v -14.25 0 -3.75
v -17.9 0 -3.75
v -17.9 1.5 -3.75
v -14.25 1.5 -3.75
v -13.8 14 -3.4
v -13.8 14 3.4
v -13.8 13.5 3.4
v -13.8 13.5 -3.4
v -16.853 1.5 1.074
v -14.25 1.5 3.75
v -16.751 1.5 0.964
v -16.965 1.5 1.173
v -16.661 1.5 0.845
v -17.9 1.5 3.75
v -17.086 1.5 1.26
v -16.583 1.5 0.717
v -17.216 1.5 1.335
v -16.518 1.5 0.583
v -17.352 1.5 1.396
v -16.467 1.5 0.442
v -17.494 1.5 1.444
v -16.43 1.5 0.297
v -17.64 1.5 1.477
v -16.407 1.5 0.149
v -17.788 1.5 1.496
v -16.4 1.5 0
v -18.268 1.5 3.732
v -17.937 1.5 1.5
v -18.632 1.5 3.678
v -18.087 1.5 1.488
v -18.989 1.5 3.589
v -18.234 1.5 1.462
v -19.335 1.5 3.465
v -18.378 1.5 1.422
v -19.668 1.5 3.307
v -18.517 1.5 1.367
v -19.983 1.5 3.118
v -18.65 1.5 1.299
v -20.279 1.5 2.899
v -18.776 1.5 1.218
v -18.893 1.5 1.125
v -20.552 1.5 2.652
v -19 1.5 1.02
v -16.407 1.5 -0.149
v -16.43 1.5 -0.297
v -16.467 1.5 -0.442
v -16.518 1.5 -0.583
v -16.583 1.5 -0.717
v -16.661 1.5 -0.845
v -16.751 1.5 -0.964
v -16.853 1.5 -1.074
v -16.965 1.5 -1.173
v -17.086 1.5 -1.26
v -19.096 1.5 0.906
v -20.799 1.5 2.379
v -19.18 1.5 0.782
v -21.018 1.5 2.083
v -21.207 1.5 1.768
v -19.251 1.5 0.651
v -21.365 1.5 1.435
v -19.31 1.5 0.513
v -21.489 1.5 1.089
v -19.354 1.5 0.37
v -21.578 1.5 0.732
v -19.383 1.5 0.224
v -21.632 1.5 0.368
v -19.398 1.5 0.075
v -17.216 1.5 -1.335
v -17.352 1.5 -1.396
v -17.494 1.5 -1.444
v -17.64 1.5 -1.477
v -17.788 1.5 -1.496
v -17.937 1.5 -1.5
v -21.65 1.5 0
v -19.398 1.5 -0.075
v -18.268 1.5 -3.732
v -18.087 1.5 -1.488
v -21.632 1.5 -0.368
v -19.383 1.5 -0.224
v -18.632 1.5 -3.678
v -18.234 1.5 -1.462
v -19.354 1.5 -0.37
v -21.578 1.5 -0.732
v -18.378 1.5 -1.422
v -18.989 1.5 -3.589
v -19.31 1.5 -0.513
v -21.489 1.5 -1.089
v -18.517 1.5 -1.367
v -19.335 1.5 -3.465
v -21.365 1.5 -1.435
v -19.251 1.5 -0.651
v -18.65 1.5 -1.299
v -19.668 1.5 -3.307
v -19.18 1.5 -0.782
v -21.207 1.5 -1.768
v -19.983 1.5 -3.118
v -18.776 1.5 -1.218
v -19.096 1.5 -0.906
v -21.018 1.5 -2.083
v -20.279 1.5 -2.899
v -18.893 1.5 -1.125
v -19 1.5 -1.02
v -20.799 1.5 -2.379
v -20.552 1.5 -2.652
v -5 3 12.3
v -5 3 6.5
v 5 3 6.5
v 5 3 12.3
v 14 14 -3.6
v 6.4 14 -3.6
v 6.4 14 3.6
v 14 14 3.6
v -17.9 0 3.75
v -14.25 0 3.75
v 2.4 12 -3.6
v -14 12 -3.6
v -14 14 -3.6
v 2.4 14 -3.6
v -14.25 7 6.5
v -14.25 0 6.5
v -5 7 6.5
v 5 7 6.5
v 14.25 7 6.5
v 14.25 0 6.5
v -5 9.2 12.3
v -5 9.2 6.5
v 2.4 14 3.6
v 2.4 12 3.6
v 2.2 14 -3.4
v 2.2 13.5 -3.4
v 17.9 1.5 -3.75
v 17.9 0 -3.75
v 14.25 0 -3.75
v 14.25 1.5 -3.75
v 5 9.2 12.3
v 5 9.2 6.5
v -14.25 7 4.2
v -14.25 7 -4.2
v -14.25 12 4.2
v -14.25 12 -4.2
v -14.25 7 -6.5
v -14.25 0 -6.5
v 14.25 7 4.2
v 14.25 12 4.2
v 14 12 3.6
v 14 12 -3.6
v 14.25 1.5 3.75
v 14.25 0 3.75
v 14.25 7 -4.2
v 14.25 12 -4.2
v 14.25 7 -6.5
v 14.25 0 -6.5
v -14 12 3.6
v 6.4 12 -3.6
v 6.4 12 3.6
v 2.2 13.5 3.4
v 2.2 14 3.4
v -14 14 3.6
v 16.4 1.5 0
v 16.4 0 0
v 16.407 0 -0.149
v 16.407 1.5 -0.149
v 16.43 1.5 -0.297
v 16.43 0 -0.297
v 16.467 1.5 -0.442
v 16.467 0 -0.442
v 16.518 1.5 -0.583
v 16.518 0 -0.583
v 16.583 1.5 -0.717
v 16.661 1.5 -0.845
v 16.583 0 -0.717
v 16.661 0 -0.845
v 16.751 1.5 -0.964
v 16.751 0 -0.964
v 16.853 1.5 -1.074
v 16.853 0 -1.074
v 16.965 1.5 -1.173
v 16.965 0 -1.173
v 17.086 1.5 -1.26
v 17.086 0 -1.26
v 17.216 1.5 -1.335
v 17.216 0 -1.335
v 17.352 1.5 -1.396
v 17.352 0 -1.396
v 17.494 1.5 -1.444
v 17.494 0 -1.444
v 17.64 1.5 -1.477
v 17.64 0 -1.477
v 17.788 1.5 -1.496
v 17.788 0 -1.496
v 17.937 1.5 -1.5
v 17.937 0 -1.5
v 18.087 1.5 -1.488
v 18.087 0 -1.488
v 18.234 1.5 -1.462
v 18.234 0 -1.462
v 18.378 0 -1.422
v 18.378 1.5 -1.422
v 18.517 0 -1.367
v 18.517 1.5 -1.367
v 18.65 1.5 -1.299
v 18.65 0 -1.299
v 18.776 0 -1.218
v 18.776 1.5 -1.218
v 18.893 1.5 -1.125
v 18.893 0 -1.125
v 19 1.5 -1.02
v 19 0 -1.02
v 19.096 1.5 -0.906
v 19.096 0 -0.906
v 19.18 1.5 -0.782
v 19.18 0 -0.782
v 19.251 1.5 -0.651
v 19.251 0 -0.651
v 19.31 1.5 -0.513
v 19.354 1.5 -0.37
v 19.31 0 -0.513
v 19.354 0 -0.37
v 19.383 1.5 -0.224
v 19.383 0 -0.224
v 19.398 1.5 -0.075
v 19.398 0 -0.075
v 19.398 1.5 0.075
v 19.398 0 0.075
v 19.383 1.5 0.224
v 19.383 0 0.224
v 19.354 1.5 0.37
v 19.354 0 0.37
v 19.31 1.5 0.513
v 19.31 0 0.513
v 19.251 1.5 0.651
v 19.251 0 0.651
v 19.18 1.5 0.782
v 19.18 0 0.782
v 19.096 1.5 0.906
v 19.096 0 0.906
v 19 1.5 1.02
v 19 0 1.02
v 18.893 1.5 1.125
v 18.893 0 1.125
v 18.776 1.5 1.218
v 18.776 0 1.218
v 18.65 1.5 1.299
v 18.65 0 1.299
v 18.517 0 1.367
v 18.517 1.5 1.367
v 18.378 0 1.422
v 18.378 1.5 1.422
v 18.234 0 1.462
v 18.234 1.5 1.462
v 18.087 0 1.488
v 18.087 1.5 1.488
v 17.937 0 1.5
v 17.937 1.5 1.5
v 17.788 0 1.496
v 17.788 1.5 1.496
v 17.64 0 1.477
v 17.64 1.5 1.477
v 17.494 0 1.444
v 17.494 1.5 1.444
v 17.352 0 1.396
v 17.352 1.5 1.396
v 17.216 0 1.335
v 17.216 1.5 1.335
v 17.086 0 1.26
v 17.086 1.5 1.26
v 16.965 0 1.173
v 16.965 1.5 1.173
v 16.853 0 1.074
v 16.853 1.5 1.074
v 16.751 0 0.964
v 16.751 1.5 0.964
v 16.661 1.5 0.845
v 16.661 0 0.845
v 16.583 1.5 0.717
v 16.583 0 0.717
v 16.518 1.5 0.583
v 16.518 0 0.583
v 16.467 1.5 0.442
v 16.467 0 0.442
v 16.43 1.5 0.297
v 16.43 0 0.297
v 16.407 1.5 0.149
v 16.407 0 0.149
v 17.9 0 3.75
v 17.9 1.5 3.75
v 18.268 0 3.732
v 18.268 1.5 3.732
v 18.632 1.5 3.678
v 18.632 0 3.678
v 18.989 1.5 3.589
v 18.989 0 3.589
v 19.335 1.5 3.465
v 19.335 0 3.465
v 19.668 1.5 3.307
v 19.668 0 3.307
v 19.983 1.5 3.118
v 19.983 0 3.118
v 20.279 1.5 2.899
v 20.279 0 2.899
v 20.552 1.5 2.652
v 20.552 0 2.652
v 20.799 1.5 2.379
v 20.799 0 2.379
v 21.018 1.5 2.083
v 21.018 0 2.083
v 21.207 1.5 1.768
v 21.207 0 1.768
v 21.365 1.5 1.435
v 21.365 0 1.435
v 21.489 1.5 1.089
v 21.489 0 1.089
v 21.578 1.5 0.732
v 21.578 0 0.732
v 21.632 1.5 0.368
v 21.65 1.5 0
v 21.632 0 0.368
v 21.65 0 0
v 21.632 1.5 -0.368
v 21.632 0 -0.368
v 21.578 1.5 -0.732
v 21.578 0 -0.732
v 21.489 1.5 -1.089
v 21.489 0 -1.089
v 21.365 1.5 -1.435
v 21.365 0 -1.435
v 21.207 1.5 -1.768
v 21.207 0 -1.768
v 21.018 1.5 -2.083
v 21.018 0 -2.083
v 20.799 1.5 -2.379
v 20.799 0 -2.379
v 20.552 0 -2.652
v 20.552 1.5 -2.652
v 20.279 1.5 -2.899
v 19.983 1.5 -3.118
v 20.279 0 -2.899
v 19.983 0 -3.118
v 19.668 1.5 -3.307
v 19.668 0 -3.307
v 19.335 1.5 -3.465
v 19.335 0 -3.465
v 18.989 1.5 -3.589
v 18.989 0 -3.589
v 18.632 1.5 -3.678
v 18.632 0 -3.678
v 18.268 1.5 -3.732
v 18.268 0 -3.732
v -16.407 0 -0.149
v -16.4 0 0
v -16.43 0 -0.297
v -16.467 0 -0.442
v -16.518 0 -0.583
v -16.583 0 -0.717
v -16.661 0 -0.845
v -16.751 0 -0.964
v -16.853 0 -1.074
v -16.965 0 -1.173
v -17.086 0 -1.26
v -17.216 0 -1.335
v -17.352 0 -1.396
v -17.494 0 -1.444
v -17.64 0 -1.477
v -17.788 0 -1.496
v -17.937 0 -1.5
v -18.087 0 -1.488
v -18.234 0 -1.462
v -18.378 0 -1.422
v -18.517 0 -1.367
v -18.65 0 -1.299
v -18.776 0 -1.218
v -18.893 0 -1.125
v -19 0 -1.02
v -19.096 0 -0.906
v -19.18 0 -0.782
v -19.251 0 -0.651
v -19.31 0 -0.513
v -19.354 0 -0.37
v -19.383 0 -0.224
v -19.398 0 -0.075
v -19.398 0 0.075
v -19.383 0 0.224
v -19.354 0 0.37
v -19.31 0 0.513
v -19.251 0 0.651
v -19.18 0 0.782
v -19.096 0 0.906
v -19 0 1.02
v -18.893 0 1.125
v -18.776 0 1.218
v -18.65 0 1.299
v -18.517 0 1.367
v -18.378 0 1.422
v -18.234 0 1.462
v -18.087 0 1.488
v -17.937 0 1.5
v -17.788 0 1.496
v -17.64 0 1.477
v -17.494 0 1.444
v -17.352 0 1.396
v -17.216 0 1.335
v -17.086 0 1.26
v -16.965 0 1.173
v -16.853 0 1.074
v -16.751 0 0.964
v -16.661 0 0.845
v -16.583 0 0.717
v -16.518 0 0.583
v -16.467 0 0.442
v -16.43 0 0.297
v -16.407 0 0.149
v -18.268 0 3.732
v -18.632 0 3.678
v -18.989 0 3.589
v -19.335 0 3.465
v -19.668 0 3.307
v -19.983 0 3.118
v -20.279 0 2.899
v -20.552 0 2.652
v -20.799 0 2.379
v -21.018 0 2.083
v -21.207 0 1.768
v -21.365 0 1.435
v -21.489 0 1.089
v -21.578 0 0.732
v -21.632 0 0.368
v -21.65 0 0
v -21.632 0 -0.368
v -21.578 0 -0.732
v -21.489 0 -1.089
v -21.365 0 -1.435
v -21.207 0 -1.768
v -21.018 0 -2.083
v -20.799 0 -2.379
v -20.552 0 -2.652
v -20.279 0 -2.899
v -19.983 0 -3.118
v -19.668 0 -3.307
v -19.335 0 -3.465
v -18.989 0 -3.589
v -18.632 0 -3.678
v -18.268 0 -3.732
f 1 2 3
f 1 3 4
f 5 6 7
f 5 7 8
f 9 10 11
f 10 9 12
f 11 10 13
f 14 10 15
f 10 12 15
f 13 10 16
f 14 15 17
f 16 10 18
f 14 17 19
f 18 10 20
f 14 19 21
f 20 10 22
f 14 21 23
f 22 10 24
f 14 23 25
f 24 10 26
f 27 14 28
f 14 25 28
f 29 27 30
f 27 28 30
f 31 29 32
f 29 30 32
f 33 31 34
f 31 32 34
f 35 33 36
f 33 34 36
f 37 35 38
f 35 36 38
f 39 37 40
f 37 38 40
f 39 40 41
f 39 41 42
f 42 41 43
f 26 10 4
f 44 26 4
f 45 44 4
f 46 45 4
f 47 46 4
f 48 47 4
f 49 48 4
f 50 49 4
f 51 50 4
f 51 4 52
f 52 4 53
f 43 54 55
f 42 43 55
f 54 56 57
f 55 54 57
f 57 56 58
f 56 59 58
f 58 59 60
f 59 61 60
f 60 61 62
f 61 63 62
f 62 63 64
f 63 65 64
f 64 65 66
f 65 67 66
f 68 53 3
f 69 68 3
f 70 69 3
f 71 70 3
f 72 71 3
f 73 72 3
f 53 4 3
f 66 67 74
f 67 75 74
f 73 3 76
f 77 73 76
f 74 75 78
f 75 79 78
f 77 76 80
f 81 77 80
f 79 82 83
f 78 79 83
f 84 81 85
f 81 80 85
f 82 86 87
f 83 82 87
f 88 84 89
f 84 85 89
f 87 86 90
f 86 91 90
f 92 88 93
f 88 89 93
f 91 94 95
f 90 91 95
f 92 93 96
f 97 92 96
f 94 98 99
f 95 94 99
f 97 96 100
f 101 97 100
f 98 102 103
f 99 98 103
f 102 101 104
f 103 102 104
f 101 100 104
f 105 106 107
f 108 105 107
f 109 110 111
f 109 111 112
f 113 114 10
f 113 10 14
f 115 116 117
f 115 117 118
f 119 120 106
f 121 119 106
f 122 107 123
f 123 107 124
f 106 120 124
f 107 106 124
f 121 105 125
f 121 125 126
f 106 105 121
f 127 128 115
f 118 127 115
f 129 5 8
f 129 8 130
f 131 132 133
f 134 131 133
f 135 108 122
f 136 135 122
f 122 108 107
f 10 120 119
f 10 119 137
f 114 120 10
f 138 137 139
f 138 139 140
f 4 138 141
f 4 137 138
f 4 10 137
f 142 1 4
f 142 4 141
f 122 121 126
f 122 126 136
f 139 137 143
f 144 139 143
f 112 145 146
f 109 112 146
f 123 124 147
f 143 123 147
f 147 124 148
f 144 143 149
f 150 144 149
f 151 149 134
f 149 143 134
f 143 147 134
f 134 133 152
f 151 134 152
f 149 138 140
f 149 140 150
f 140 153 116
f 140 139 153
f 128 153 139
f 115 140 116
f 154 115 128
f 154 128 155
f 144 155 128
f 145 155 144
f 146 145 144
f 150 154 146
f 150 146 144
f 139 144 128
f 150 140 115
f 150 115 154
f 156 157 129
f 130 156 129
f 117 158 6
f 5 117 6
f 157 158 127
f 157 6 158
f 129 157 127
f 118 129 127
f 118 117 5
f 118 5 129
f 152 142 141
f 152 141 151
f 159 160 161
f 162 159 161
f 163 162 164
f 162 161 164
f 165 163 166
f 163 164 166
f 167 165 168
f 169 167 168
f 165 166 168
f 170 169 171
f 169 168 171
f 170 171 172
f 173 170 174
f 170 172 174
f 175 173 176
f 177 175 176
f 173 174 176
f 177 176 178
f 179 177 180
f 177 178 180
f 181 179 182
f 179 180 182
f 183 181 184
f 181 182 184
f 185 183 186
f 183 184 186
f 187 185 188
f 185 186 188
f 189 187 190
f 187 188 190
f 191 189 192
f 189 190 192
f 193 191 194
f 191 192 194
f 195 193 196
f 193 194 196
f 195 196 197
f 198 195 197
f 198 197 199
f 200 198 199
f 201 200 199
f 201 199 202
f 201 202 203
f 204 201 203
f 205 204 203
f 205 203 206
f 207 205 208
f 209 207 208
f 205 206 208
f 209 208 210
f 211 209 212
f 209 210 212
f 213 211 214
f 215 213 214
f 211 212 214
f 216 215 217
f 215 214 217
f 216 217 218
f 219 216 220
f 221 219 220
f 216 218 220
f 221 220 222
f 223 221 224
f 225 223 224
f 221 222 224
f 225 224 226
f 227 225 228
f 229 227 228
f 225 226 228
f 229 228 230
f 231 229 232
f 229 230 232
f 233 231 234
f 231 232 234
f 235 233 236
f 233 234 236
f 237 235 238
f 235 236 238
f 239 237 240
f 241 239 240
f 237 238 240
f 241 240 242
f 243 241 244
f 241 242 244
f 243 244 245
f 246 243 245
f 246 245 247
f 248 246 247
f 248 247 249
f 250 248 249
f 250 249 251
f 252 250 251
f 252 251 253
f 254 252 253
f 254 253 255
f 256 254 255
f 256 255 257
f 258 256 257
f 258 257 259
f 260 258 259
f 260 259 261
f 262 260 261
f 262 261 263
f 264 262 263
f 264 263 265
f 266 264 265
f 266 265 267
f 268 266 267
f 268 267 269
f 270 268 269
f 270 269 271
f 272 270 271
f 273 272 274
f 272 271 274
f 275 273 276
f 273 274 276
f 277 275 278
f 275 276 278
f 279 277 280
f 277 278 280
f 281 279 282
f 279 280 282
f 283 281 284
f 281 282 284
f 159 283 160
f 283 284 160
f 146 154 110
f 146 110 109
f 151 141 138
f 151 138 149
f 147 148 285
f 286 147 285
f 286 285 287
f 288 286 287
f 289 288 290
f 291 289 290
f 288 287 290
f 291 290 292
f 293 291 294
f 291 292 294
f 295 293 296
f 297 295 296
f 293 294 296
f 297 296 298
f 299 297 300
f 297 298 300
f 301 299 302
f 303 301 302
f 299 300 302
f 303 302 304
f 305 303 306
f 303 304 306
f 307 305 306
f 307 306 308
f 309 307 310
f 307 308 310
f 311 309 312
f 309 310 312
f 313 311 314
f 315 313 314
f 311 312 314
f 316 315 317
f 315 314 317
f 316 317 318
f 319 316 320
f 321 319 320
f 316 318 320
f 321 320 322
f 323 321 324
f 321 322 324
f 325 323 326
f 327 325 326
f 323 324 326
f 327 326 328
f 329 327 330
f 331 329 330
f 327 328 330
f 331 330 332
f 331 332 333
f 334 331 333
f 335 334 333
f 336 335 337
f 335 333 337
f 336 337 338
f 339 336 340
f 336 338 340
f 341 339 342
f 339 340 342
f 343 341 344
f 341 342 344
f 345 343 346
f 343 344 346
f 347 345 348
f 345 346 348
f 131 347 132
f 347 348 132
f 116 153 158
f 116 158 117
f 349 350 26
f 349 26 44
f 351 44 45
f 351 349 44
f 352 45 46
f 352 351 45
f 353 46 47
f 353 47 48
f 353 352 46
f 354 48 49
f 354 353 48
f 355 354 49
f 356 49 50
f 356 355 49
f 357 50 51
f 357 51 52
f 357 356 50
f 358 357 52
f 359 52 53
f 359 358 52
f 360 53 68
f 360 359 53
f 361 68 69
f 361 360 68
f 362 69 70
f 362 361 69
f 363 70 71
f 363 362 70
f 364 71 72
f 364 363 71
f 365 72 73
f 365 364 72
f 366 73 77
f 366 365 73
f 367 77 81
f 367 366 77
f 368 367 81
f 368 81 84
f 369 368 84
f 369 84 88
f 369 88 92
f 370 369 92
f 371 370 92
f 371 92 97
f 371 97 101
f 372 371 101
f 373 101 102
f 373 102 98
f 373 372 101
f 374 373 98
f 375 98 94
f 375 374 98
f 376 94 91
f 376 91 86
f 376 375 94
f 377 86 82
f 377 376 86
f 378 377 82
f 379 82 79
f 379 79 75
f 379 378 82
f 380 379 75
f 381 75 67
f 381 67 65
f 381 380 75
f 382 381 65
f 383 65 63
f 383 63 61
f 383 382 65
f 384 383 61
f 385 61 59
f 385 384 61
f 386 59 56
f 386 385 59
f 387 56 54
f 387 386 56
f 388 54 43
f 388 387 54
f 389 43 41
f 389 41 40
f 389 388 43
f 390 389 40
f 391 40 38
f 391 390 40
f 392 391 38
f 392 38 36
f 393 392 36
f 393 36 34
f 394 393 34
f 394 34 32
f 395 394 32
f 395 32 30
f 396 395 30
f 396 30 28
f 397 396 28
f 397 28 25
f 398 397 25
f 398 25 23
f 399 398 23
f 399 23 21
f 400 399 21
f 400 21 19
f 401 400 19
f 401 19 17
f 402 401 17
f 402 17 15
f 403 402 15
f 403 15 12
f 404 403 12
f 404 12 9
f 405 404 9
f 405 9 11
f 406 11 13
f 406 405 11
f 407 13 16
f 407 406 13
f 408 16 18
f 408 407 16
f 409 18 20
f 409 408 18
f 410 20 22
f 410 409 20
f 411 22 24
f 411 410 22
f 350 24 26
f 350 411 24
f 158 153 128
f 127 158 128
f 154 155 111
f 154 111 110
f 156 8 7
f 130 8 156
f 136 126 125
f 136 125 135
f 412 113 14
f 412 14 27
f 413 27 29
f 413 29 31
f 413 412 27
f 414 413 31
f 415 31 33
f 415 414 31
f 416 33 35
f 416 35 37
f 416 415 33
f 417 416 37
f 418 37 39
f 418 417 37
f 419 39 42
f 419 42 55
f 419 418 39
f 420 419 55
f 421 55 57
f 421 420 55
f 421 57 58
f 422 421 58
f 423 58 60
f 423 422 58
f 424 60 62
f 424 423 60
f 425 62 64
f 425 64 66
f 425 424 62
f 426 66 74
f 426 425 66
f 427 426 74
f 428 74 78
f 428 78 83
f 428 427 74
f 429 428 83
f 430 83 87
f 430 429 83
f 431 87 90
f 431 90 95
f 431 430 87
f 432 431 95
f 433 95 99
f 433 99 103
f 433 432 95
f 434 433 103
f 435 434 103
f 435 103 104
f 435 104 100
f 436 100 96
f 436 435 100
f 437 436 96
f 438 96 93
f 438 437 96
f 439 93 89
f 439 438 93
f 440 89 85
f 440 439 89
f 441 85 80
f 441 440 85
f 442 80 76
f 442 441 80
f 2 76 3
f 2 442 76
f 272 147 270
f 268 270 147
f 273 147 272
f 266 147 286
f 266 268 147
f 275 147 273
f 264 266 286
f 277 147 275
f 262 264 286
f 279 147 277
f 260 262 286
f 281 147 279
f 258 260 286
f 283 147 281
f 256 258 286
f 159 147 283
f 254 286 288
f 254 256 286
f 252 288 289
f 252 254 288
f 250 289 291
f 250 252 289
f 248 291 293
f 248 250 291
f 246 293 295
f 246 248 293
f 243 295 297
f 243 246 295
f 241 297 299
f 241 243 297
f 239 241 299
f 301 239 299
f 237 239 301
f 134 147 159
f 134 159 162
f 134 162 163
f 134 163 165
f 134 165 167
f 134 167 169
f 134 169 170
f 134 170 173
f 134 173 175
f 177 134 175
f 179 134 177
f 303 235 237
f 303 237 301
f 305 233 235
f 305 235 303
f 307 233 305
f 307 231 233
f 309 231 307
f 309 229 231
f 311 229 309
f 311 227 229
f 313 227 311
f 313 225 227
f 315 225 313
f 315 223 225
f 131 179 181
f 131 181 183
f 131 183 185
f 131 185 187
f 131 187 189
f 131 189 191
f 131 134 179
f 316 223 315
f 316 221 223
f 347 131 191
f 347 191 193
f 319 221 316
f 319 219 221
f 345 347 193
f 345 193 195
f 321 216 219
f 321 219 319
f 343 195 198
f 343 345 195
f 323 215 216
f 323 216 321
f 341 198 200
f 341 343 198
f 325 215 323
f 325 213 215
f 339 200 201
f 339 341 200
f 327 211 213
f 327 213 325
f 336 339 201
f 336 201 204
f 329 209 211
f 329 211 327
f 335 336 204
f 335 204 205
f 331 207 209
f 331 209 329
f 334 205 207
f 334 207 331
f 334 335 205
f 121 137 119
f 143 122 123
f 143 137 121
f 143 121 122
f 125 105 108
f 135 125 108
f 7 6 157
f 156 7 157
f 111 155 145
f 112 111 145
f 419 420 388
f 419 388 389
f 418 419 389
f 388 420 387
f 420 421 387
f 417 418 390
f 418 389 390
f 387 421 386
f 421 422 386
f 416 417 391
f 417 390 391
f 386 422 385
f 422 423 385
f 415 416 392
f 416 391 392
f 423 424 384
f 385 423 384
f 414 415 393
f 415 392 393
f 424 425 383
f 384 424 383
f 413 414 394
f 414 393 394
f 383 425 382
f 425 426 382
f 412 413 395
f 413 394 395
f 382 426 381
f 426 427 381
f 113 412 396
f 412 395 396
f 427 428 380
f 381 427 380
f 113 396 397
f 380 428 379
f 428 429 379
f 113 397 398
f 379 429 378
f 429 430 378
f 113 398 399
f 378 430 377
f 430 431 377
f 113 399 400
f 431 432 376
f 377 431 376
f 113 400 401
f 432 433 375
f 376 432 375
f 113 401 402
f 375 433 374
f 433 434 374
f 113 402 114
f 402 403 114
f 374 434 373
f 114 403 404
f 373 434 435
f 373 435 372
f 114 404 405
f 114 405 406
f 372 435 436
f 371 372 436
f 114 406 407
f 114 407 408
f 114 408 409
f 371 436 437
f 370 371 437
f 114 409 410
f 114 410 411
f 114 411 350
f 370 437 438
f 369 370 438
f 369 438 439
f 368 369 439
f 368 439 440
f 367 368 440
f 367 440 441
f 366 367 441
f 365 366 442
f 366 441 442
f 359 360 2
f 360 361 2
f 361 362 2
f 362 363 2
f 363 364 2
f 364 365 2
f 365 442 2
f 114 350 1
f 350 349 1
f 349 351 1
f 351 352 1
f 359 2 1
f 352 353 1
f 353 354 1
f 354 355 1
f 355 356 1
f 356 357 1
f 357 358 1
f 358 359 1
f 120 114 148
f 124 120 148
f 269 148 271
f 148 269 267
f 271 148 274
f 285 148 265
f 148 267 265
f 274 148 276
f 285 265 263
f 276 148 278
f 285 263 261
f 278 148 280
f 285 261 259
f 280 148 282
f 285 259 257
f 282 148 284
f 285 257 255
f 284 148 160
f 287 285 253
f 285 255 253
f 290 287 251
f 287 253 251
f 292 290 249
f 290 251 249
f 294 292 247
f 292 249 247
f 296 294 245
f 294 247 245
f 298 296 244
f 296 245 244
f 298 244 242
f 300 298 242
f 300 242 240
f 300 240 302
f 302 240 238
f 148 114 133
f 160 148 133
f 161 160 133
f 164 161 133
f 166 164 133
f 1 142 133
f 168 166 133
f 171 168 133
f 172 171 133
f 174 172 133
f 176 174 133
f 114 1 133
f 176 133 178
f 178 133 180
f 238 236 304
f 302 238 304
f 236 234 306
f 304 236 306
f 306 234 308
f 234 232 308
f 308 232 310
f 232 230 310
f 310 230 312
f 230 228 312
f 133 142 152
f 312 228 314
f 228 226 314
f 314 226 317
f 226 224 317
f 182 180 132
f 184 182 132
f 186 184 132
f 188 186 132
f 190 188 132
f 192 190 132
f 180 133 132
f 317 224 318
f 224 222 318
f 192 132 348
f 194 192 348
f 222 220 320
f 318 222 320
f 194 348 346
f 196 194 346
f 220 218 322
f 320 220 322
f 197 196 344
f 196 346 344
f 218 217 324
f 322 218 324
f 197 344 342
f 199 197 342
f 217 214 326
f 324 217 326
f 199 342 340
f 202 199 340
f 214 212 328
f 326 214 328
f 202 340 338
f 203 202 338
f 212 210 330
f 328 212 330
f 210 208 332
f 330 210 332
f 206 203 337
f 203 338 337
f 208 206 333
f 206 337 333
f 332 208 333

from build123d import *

# Parameters (mm, degrees)
SKETCH1_W           = 28.5
SKETCH1_H           = 13
BOSS_EXTRUDE1_DEPTH = 7
SKETCH2_W           = 28.5
SKETCH2_H           = 8.4
BOSS_EXTRUDE2_DEPTH = 5
SKETCH4_W           = 16.4
SKETCH4_H           = 7.2
SKETCH4_W_2         = 7.6
BOSS_EXTRUDE3_DEPTH = 2
SKETCH5_W           = 16
SKETCH5_H           = 6.8
CUT_EXTRUDE1_DEPTH  = 0.5
SKETCH6_R           = 1.5
BOSS_EXTRUDE4_DEPTH = 1.5
SKETCH7_W           = 10
SKETCH7_H           = 5.8
BOSS_EXTRUDE5_DEPTH = 6.2


with BuildPart() as part:
    # Sketch1 → Boss-Extrude1 (new body)
    with BuildSketch(Plane(origin=(0, 0, 0), x_dir=(1, 0, 0), z_dir=(0, 1, 0))):
        Rectangle(SKETCH1_W, SKETCH1_H)
    extrude(amount=BOSS_EXTRUDE1_DEPTH)

    # Sketch2 → Boss-Extrude2 (add)
    with BuildSketch(Plane(origin=(0, 7, 0), x_dir=(1, 0, 0), z_dir=(0, 1, 0))):
        Rectangle(SKETCH2_W, SKETCH2_H)
    extrude(amount=BOSS_EXTRUDE2_DEPTH)

    # Sketch4 → Boss-Extrude3 (add)
    with BuildSketch(Plane(origin=(0, 12, 0), x_dir=(1, 0, 0), z_dir=(0, 1, 0))):
        with Locations((-5.8, 0)):
            Rectangle(SKETCH4_W, SKETCH4_H)
        with Locations((10.2, 0)):
            Rectangle(SKETCH4_W_2, SKETCH4_H)
    extrude(amount=BOSS_EXTRUDE3_DEPTH)

    # Sketch5 → Cut-Extrude1 (cut)
    with BuildSketch(Plane(origin=(0, 14, 0), x_dir=(1, 0, 0), z_dir=(0, 1, 0))):
        with Locations((-5.8, 0)):
            Rectangle(SKETCH5_W, SKETCH5_H)
    extrude(amount=-CUT_EXTRUDE1_DEPTH, mode=Mode.SUBTRACT)

    # Sketch6 → Boss-Extrude4 (add)
    with BuildSketch(Plane(origin=(0, 0, 0), x_dir=(1, 0, 0), z_dir=(0, 1, 0))):
        with BuildLine():
            Line((-14.25, 3.75), (-14.25, -3.75))
            Line((-14.25, -3.75), (-17.9, -3.75))
            ThreePointArc((-17.9, -3.75), (-21.65, 0), (-17.9, 3.75))
            Line((-17.9, 3.75), (-14.25, 3.75))
        make_face()
        with Locations((-17.9, 0)):
            Circle(SKETCH6_R, mode=Mode.SUBTRACT)
    boss_extrude4 = extrude(amount=BOSS_EXTRUDE4_DEPTH)

    # Mirror1: Boss-Extrude4 across plane
    add(boss_extrude4.mirror(Plane(origin=(0, 0, 0), x_dir=(0, 0, 1), z_dir=(1, 0, 0))))

    # Sketch7 → Boss-Extrude5 (add)
    with BuildSketch(Plane(origin=(0, 3, 0), x_dir=(1, 0, 0), z_dir=(0, 1, 0))):
        with Locations((0, -9.4)):
            Rectangle(SKETCH7_W, SKETCH7_H)
    extrude(amount=BOSS_EXTRUDE5_DEPTH)


solid = part.part
